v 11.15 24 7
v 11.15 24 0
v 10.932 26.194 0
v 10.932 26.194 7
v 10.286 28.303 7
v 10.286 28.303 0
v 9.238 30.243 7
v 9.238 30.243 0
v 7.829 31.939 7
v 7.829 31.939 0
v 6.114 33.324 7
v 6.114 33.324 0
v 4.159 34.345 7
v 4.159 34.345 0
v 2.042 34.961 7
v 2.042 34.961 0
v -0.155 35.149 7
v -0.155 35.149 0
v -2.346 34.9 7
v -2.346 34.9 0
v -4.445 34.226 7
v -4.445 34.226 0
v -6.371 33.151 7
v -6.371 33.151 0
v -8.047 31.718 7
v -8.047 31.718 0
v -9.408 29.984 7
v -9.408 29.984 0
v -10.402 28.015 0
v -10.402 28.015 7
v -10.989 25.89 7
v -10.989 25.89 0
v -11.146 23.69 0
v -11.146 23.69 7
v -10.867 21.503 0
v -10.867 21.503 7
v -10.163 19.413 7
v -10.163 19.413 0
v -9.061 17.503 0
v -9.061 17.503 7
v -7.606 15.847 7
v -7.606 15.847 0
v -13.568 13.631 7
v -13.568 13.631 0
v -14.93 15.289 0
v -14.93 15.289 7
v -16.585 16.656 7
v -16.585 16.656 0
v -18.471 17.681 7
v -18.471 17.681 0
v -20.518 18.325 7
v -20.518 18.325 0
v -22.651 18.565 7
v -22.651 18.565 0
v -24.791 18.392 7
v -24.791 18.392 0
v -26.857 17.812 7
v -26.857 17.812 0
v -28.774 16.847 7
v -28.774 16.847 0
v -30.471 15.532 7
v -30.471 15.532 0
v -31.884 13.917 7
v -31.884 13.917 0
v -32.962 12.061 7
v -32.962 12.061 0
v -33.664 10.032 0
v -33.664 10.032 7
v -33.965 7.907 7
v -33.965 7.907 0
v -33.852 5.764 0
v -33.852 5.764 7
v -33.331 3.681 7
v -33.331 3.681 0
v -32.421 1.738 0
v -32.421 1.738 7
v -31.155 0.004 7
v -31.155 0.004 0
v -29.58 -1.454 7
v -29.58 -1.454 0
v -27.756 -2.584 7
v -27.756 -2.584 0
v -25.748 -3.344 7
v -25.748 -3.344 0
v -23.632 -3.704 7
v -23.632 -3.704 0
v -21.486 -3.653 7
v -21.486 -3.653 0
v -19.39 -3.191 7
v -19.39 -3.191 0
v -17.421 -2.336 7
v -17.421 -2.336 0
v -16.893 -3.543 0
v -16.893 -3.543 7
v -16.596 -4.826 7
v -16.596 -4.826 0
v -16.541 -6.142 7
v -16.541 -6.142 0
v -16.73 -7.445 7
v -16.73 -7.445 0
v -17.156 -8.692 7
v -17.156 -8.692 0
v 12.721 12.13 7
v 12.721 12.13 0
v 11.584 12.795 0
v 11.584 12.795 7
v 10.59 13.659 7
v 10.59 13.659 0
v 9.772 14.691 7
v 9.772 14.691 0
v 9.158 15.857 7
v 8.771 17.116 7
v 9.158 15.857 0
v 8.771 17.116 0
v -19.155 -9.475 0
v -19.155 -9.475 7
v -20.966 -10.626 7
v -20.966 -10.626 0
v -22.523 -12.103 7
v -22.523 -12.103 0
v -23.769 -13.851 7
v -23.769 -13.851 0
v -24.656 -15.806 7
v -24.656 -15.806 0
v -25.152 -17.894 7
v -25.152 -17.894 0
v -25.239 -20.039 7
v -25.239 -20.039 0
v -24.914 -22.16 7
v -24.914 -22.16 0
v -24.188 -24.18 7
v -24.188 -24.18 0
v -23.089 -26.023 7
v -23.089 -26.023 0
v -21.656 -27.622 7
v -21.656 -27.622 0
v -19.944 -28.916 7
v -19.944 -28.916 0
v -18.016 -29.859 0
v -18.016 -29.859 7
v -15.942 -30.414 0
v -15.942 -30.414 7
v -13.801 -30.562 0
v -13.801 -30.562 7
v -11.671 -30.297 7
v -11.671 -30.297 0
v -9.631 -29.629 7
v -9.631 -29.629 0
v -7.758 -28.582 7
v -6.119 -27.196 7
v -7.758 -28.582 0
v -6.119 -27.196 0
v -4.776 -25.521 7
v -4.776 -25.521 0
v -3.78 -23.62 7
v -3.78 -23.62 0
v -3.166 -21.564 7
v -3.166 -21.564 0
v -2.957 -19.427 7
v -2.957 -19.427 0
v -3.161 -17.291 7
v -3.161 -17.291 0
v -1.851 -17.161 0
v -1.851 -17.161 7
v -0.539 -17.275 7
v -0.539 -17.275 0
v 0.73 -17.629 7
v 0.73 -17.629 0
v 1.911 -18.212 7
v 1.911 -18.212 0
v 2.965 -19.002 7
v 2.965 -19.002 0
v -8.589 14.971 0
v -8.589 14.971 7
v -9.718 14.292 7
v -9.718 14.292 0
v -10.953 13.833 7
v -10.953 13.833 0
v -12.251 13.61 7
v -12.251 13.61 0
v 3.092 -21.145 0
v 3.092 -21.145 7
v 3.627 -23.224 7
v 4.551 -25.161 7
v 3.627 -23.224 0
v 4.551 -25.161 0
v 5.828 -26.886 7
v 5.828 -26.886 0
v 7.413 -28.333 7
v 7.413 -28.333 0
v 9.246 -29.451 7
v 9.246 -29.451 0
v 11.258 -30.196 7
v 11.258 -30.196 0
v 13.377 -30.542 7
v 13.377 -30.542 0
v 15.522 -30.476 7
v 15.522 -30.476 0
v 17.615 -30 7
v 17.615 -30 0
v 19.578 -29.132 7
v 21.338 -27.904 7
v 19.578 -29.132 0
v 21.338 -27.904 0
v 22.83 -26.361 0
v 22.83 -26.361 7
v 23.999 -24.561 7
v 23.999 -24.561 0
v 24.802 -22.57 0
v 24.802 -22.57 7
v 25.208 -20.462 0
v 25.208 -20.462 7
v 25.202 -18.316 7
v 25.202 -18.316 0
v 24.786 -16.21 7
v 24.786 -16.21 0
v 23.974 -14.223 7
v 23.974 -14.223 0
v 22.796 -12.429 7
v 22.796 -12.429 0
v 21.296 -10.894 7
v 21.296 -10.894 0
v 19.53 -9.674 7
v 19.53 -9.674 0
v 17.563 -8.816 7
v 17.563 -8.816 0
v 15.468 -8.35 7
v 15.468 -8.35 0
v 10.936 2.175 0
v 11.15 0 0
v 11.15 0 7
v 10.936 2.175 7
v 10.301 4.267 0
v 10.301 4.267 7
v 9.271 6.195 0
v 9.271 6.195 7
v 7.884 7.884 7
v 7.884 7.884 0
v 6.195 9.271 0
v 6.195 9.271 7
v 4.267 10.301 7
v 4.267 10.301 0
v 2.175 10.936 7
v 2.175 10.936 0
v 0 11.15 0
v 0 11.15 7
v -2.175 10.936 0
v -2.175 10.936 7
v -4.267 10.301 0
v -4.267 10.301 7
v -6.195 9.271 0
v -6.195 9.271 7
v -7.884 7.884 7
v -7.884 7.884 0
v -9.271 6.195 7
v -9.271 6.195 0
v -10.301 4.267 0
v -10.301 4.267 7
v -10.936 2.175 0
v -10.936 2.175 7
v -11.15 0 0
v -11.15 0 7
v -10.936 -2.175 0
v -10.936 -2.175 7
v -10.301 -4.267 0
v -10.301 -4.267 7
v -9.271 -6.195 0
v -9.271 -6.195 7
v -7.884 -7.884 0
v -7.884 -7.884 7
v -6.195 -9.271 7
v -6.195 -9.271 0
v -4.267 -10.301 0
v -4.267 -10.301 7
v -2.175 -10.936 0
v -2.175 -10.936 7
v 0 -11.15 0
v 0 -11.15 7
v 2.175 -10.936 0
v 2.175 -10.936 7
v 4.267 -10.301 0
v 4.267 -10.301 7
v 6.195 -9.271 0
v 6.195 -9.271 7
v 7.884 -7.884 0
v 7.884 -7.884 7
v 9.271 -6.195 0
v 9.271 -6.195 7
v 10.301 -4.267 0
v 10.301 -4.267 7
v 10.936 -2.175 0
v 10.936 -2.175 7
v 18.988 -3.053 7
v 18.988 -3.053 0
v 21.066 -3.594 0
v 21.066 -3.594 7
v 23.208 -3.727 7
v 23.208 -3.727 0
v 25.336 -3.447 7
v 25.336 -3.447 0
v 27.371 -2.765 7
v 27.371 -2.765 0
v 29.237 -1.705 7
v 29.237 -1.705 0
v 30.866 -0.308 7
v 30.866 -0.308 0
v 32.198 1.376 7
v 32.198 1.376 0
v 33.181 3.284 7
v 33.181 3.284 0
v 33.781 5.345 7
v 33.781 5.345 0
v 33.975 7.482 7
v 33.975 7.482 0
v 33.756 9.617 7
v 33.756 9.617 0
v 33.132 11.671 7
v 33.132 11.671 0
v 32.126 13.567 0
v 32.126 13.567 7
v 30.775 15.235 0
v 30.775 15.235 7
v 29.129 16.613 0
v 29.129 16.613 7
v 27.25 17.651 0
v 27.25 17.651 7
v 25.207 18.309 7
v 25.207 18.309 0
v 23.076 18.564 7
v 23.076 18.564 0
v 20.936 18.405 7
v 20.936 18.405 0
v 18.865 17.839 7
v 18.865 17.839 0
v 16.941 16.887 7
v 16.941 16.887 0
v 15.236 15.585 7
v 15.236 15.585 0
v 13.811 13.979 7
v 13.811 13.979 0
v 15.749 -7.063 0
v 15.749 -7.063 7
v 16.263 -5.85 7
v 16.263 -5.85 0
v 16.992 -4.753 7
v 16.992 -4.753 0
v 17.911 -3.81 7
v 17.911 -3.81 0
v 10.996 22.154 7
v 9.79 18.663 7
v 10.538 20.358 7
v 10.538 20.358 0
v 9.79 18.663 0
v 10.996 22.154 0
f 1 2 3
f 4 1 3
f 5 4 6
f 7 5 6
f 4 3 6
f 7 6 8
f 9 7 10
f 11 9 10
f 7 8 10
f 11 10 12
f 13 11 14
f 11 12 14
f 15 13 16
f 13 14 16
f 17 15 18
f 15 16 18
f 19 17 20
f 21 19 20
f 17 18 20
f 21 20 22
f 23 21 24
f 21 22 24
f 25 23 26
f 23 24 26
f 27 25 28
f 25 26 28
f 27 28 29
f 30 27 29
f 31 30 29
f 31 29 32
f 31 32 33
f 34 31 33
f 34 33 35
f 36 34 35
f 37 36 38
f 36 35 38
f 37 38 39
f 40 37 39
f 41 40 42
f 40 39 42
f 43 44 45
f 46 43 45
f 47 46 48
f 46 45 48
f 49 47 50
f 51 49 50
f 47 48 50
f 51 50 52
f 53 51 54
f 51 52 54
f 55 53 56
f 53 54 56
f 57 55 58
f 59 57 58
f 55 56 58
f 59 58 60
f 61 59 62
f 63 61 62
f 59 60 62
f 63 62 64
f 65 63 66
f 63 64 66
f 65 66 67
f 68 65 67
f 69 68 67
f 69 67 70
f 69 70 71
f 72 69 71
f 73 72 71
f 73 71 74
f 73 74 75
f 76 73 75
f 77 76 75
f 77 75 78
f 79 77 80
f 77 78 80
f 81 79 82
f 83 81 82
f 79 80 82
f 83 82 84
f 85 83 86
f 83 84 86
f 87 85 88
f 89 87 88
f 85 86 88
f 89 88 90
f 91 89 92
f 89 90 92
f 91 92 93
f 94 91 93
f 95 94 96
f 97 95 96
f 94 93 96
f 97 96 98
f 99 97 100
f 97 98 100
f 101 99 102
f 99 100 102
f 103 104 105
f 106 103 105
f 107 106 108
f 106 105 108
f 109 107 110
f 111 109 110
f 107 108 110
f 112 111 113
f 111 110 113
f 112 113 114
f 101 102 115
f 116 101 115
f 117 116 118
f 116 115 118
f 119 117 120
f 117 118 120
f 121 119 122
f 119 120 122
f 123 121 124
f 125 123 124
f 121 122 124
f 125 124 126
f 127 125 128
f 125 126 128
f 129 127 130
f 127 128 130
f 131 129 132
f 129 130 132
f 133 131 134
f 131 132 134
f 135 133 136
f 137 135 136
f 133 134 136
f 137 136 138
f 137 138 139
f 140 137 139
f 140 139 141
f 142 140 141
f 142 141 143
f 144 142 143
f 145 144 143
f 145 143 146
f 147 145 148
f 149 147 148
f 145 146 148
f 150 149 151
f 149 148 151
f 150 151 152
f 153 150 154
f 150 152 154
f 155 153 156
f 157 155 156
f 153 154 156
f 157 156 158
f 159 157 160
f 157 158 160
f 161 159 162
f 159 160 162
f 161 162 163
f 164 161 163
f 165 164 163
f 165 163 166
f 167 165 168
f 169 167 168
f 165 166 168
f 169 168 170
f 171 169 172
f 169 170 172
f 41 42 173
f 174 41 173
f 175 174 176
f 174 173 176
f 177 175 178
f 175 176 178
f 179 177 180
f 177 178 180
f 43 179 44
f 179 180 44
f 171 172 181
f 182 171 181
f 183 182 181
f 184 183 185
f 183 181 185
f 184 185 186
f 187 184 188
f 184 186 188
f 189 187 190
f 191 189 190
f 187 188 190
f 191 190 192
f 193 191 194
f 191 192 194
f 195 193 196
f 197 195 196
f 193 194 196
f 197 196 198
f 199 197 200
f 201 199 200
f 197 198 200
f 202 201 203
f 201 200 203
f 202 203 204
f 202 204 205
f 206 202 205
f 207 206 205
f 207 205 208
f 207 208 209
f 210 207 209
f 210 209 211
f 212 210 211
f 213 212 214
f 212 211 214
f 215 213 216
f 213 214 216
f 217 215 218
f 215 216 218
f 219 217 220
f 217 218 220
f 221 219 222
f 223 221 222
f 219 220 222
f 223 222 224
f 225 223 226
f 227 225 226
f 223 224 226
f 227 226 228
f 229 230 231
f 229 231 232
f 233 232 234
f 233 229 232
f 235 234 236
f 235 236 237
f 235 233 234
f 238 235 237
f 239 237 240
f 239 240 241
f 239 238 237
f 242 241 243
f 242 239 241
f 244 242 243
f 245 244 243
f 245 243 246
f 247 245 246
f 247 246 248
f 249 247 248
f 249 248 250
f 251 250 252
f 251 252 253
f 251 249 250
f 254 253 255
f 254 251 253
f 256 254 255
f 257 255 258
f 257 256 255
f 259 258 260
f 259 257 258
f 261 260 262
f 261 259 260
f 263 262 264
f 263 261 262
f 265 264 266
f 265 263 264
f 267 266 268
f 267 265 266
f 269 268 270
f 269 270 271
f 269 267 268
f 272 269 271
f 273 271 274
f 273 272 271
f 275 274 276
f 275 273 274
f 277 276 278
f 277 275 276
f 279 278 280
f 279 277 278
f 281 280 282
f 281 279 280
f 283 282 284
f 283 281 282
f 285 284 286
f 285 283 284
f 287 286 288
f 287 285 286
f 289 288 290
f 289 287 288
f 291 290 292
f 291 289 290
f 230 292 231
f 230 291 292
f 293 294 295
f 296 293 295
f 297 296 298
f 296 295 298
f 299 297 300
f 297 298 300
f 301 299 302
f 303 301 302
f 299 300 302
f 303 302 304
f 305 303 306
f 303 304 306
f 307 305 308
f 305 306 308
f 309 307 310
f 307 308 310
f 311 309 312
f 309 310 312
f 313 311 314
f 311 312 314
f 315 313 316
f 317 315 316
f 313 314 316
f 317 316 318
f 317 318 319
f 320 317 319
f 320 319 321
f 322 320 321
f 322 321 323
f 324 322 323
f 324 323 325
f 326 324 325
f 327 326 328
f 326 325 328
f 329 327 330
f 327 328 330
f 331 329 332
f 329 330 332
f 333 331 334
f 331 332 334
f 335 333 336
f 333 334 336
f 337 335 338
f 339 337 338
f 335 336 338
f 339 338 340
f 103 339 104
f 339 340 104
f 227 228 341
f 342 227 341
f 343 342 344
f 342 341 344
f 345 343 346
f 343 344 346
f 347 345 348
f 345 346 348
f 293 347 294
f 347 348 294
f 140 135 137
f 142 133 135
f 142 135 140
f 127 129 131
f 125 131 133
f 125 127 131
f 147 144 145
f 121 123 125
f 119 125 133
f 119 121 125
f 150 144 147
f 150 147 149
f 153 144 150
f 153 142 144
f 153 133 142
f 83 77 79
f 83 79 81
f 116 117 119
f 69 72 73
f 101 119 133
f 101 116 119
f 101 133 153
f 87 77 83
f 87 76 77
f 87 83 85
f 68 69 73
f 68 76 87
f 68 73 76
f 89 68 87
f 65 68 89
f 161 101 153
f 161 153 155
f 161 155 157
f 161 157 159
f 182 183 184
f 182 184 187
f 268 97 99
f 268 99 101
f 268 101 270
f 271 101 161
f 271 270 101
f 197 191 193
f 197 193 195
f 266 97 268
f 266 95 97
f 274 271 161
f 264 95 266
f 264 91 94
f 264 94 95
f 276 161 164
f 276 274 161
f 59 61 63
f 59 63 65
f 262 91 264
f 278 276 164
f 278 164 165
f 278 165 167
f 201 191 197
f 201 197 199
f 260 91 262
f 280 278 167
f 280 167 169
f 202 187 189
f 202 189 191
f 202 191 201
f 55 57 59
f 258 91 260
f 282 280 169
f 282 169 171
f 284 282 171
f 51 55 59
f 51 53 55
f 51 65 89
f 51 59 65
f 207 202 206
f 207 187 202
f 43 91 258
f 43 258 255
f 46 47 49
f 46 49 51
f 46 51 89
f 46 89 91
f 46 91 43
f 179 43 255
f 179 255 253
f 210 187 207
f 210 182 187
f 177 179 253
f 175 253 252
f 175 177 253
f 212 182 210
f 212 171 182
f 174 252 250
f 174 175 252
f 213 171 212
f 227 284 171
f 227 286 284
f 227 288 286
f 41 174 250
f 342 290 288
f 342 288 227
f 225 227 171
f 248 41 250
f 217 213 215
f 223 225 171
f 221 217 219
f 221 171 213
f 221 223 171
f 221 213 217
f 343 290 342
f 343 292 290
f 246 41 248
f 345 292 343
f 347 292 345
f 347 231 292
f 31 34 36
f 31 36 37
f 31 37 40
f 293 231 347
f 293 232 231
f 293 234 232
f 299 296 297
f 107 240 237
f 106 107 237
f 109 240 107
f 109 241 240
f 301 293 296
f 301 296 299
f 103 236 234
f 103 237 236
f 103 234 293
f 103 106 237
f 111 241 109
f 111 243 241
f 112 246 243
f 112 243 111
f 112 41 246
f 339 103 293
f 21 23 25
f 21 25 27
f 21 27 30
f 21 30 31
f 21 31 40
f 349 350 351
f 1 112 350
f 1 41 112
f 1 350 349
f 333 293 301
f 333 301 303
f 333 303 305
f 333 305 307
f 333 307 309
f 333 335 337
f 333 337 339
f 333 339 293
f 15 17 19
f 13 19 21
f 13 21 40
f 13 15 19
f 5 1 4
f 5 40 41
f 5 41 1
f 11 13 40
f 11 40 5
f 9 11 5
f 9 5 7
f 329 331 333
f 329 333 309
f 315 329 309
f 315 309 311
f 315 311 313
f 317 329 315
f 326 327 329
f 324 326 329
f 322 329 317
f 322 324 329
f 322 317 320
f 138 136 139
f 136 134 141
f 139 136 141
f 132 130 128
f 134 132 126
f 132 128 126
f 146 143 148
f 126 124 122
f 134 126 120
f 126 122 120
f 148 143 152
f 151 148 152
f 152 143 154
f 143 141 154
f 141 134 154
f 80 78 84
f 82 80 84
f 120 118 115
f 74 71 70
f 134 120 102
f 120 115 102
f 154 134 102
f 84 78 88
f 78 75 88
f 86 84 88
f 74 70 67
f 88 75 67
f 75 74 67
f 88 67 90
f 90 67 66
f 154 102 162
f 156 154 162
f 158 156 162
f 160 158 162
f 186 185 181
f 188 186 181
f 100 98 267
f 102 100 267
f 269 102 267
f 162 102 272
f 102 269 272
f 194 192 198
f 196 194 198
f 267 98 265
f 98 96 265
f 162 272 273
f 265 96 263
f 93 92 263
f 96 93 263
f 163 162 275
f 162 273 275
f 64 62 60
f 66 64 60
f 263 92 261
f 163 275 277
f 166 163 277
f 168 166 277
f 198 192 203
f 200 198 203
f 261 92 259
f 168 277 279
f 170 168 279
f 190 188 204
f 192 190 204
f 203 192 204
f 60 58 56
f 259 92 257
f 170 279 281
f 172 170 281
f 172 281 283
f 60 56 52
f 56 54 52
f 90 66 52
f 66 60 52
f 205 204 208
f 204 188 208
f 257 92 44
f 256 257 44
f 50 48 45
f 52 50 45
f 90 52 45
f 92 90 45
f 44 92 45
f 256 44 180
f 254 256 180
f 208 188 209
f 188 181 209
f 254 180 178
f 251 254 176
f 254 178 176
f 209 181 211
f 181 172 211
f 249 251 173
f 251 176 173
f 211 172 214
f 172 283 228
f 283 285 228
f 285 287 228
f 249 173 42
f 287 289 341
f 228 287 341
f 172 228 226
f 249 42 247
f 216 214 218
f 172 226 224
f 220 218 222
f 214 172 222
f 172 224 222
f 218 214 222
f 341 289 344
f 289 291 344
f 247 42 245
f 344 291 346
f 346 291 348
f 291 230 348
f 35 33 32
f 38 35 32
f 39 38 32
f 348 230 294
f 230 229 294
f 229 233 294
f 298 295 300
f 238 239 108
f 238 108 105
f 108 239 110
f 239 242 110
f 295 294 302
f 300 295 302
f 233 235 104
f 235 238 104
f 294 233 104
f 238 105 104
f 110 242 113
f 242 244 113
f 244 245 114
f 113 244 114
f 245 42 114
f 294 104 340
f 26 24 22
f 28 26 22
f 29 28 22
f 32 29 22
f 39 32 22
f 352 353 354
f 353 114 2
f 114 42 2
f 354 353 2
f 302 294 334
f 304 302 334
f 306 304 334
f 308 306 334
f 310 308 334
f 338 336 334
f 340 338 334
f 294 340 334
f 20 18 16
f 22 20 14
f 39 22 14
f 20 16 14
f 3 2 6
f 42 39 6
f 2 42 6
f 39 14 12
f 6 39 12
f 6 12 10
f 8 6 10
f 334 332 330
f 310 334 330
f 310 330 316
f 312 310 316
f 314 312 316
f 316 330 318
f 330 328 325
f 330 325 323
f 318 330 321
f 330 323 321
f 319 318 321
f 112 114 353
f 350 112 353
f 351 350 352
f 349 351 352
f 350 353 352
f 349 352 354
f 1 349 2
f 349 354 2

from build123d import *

# Parameters (mm, degrees)
F0_R     = 11.15
F1_DEPTH = 7


with BuildPart() as f1:
    # F0 (on Top) → F1 (new body)
    with BuildSketch(Plane.XY):
        with BuildLine():
            ThreePointArc((12.720798, 12.13026), (10.156571, 14.156134), (8.770986, 17.115793))
            ThreePointArc((8.770986, 17.115793), (10.538477, 20.358159), (11.15, 24))
            ThreePointArc((11.15, 24), (-4.445213, 34.225585), (-7.60562, 15.846654))
            ThreePointArc((-7.60562, 15.846654), (-10.324731, 14.03396), (-13.567703, 13.630774))
            ThreePointArc((-13.567703, 13.630774), (-33.664157, 10.032303), (-17.421329, -2.336489))
            ThreePointArc((-17.421329, -2.336489), (-16.537606, -5.48267), (-17.156287, -8.691511))
            ThreePointArc((-17.156287, -8.691511), (-19.944084, -28.916363), (-3.161354, -17.290683))
            ThreePointArc((-3.161354, -17.290683), (0.103928, -17.422436), (2.964534, -19.002424))
            ThreePointArc((2.964534, -19.002424), (21.338035, -27.903599), (15.467505, -8.349741))
            ThreePointArc((15.467505, -8.349741), (16.601837, -5.284987), (18.98847, -3.052632))
            ThreePointArc((18.98847, -3.052632), (33.131715, 11.670991), (12.720798, 12.13026))
        make_face()
        Circle(F0_R, mode=Mode.SUBTRACT)
    extrude(amount=F1_DEPTH)


solid = f1.part
